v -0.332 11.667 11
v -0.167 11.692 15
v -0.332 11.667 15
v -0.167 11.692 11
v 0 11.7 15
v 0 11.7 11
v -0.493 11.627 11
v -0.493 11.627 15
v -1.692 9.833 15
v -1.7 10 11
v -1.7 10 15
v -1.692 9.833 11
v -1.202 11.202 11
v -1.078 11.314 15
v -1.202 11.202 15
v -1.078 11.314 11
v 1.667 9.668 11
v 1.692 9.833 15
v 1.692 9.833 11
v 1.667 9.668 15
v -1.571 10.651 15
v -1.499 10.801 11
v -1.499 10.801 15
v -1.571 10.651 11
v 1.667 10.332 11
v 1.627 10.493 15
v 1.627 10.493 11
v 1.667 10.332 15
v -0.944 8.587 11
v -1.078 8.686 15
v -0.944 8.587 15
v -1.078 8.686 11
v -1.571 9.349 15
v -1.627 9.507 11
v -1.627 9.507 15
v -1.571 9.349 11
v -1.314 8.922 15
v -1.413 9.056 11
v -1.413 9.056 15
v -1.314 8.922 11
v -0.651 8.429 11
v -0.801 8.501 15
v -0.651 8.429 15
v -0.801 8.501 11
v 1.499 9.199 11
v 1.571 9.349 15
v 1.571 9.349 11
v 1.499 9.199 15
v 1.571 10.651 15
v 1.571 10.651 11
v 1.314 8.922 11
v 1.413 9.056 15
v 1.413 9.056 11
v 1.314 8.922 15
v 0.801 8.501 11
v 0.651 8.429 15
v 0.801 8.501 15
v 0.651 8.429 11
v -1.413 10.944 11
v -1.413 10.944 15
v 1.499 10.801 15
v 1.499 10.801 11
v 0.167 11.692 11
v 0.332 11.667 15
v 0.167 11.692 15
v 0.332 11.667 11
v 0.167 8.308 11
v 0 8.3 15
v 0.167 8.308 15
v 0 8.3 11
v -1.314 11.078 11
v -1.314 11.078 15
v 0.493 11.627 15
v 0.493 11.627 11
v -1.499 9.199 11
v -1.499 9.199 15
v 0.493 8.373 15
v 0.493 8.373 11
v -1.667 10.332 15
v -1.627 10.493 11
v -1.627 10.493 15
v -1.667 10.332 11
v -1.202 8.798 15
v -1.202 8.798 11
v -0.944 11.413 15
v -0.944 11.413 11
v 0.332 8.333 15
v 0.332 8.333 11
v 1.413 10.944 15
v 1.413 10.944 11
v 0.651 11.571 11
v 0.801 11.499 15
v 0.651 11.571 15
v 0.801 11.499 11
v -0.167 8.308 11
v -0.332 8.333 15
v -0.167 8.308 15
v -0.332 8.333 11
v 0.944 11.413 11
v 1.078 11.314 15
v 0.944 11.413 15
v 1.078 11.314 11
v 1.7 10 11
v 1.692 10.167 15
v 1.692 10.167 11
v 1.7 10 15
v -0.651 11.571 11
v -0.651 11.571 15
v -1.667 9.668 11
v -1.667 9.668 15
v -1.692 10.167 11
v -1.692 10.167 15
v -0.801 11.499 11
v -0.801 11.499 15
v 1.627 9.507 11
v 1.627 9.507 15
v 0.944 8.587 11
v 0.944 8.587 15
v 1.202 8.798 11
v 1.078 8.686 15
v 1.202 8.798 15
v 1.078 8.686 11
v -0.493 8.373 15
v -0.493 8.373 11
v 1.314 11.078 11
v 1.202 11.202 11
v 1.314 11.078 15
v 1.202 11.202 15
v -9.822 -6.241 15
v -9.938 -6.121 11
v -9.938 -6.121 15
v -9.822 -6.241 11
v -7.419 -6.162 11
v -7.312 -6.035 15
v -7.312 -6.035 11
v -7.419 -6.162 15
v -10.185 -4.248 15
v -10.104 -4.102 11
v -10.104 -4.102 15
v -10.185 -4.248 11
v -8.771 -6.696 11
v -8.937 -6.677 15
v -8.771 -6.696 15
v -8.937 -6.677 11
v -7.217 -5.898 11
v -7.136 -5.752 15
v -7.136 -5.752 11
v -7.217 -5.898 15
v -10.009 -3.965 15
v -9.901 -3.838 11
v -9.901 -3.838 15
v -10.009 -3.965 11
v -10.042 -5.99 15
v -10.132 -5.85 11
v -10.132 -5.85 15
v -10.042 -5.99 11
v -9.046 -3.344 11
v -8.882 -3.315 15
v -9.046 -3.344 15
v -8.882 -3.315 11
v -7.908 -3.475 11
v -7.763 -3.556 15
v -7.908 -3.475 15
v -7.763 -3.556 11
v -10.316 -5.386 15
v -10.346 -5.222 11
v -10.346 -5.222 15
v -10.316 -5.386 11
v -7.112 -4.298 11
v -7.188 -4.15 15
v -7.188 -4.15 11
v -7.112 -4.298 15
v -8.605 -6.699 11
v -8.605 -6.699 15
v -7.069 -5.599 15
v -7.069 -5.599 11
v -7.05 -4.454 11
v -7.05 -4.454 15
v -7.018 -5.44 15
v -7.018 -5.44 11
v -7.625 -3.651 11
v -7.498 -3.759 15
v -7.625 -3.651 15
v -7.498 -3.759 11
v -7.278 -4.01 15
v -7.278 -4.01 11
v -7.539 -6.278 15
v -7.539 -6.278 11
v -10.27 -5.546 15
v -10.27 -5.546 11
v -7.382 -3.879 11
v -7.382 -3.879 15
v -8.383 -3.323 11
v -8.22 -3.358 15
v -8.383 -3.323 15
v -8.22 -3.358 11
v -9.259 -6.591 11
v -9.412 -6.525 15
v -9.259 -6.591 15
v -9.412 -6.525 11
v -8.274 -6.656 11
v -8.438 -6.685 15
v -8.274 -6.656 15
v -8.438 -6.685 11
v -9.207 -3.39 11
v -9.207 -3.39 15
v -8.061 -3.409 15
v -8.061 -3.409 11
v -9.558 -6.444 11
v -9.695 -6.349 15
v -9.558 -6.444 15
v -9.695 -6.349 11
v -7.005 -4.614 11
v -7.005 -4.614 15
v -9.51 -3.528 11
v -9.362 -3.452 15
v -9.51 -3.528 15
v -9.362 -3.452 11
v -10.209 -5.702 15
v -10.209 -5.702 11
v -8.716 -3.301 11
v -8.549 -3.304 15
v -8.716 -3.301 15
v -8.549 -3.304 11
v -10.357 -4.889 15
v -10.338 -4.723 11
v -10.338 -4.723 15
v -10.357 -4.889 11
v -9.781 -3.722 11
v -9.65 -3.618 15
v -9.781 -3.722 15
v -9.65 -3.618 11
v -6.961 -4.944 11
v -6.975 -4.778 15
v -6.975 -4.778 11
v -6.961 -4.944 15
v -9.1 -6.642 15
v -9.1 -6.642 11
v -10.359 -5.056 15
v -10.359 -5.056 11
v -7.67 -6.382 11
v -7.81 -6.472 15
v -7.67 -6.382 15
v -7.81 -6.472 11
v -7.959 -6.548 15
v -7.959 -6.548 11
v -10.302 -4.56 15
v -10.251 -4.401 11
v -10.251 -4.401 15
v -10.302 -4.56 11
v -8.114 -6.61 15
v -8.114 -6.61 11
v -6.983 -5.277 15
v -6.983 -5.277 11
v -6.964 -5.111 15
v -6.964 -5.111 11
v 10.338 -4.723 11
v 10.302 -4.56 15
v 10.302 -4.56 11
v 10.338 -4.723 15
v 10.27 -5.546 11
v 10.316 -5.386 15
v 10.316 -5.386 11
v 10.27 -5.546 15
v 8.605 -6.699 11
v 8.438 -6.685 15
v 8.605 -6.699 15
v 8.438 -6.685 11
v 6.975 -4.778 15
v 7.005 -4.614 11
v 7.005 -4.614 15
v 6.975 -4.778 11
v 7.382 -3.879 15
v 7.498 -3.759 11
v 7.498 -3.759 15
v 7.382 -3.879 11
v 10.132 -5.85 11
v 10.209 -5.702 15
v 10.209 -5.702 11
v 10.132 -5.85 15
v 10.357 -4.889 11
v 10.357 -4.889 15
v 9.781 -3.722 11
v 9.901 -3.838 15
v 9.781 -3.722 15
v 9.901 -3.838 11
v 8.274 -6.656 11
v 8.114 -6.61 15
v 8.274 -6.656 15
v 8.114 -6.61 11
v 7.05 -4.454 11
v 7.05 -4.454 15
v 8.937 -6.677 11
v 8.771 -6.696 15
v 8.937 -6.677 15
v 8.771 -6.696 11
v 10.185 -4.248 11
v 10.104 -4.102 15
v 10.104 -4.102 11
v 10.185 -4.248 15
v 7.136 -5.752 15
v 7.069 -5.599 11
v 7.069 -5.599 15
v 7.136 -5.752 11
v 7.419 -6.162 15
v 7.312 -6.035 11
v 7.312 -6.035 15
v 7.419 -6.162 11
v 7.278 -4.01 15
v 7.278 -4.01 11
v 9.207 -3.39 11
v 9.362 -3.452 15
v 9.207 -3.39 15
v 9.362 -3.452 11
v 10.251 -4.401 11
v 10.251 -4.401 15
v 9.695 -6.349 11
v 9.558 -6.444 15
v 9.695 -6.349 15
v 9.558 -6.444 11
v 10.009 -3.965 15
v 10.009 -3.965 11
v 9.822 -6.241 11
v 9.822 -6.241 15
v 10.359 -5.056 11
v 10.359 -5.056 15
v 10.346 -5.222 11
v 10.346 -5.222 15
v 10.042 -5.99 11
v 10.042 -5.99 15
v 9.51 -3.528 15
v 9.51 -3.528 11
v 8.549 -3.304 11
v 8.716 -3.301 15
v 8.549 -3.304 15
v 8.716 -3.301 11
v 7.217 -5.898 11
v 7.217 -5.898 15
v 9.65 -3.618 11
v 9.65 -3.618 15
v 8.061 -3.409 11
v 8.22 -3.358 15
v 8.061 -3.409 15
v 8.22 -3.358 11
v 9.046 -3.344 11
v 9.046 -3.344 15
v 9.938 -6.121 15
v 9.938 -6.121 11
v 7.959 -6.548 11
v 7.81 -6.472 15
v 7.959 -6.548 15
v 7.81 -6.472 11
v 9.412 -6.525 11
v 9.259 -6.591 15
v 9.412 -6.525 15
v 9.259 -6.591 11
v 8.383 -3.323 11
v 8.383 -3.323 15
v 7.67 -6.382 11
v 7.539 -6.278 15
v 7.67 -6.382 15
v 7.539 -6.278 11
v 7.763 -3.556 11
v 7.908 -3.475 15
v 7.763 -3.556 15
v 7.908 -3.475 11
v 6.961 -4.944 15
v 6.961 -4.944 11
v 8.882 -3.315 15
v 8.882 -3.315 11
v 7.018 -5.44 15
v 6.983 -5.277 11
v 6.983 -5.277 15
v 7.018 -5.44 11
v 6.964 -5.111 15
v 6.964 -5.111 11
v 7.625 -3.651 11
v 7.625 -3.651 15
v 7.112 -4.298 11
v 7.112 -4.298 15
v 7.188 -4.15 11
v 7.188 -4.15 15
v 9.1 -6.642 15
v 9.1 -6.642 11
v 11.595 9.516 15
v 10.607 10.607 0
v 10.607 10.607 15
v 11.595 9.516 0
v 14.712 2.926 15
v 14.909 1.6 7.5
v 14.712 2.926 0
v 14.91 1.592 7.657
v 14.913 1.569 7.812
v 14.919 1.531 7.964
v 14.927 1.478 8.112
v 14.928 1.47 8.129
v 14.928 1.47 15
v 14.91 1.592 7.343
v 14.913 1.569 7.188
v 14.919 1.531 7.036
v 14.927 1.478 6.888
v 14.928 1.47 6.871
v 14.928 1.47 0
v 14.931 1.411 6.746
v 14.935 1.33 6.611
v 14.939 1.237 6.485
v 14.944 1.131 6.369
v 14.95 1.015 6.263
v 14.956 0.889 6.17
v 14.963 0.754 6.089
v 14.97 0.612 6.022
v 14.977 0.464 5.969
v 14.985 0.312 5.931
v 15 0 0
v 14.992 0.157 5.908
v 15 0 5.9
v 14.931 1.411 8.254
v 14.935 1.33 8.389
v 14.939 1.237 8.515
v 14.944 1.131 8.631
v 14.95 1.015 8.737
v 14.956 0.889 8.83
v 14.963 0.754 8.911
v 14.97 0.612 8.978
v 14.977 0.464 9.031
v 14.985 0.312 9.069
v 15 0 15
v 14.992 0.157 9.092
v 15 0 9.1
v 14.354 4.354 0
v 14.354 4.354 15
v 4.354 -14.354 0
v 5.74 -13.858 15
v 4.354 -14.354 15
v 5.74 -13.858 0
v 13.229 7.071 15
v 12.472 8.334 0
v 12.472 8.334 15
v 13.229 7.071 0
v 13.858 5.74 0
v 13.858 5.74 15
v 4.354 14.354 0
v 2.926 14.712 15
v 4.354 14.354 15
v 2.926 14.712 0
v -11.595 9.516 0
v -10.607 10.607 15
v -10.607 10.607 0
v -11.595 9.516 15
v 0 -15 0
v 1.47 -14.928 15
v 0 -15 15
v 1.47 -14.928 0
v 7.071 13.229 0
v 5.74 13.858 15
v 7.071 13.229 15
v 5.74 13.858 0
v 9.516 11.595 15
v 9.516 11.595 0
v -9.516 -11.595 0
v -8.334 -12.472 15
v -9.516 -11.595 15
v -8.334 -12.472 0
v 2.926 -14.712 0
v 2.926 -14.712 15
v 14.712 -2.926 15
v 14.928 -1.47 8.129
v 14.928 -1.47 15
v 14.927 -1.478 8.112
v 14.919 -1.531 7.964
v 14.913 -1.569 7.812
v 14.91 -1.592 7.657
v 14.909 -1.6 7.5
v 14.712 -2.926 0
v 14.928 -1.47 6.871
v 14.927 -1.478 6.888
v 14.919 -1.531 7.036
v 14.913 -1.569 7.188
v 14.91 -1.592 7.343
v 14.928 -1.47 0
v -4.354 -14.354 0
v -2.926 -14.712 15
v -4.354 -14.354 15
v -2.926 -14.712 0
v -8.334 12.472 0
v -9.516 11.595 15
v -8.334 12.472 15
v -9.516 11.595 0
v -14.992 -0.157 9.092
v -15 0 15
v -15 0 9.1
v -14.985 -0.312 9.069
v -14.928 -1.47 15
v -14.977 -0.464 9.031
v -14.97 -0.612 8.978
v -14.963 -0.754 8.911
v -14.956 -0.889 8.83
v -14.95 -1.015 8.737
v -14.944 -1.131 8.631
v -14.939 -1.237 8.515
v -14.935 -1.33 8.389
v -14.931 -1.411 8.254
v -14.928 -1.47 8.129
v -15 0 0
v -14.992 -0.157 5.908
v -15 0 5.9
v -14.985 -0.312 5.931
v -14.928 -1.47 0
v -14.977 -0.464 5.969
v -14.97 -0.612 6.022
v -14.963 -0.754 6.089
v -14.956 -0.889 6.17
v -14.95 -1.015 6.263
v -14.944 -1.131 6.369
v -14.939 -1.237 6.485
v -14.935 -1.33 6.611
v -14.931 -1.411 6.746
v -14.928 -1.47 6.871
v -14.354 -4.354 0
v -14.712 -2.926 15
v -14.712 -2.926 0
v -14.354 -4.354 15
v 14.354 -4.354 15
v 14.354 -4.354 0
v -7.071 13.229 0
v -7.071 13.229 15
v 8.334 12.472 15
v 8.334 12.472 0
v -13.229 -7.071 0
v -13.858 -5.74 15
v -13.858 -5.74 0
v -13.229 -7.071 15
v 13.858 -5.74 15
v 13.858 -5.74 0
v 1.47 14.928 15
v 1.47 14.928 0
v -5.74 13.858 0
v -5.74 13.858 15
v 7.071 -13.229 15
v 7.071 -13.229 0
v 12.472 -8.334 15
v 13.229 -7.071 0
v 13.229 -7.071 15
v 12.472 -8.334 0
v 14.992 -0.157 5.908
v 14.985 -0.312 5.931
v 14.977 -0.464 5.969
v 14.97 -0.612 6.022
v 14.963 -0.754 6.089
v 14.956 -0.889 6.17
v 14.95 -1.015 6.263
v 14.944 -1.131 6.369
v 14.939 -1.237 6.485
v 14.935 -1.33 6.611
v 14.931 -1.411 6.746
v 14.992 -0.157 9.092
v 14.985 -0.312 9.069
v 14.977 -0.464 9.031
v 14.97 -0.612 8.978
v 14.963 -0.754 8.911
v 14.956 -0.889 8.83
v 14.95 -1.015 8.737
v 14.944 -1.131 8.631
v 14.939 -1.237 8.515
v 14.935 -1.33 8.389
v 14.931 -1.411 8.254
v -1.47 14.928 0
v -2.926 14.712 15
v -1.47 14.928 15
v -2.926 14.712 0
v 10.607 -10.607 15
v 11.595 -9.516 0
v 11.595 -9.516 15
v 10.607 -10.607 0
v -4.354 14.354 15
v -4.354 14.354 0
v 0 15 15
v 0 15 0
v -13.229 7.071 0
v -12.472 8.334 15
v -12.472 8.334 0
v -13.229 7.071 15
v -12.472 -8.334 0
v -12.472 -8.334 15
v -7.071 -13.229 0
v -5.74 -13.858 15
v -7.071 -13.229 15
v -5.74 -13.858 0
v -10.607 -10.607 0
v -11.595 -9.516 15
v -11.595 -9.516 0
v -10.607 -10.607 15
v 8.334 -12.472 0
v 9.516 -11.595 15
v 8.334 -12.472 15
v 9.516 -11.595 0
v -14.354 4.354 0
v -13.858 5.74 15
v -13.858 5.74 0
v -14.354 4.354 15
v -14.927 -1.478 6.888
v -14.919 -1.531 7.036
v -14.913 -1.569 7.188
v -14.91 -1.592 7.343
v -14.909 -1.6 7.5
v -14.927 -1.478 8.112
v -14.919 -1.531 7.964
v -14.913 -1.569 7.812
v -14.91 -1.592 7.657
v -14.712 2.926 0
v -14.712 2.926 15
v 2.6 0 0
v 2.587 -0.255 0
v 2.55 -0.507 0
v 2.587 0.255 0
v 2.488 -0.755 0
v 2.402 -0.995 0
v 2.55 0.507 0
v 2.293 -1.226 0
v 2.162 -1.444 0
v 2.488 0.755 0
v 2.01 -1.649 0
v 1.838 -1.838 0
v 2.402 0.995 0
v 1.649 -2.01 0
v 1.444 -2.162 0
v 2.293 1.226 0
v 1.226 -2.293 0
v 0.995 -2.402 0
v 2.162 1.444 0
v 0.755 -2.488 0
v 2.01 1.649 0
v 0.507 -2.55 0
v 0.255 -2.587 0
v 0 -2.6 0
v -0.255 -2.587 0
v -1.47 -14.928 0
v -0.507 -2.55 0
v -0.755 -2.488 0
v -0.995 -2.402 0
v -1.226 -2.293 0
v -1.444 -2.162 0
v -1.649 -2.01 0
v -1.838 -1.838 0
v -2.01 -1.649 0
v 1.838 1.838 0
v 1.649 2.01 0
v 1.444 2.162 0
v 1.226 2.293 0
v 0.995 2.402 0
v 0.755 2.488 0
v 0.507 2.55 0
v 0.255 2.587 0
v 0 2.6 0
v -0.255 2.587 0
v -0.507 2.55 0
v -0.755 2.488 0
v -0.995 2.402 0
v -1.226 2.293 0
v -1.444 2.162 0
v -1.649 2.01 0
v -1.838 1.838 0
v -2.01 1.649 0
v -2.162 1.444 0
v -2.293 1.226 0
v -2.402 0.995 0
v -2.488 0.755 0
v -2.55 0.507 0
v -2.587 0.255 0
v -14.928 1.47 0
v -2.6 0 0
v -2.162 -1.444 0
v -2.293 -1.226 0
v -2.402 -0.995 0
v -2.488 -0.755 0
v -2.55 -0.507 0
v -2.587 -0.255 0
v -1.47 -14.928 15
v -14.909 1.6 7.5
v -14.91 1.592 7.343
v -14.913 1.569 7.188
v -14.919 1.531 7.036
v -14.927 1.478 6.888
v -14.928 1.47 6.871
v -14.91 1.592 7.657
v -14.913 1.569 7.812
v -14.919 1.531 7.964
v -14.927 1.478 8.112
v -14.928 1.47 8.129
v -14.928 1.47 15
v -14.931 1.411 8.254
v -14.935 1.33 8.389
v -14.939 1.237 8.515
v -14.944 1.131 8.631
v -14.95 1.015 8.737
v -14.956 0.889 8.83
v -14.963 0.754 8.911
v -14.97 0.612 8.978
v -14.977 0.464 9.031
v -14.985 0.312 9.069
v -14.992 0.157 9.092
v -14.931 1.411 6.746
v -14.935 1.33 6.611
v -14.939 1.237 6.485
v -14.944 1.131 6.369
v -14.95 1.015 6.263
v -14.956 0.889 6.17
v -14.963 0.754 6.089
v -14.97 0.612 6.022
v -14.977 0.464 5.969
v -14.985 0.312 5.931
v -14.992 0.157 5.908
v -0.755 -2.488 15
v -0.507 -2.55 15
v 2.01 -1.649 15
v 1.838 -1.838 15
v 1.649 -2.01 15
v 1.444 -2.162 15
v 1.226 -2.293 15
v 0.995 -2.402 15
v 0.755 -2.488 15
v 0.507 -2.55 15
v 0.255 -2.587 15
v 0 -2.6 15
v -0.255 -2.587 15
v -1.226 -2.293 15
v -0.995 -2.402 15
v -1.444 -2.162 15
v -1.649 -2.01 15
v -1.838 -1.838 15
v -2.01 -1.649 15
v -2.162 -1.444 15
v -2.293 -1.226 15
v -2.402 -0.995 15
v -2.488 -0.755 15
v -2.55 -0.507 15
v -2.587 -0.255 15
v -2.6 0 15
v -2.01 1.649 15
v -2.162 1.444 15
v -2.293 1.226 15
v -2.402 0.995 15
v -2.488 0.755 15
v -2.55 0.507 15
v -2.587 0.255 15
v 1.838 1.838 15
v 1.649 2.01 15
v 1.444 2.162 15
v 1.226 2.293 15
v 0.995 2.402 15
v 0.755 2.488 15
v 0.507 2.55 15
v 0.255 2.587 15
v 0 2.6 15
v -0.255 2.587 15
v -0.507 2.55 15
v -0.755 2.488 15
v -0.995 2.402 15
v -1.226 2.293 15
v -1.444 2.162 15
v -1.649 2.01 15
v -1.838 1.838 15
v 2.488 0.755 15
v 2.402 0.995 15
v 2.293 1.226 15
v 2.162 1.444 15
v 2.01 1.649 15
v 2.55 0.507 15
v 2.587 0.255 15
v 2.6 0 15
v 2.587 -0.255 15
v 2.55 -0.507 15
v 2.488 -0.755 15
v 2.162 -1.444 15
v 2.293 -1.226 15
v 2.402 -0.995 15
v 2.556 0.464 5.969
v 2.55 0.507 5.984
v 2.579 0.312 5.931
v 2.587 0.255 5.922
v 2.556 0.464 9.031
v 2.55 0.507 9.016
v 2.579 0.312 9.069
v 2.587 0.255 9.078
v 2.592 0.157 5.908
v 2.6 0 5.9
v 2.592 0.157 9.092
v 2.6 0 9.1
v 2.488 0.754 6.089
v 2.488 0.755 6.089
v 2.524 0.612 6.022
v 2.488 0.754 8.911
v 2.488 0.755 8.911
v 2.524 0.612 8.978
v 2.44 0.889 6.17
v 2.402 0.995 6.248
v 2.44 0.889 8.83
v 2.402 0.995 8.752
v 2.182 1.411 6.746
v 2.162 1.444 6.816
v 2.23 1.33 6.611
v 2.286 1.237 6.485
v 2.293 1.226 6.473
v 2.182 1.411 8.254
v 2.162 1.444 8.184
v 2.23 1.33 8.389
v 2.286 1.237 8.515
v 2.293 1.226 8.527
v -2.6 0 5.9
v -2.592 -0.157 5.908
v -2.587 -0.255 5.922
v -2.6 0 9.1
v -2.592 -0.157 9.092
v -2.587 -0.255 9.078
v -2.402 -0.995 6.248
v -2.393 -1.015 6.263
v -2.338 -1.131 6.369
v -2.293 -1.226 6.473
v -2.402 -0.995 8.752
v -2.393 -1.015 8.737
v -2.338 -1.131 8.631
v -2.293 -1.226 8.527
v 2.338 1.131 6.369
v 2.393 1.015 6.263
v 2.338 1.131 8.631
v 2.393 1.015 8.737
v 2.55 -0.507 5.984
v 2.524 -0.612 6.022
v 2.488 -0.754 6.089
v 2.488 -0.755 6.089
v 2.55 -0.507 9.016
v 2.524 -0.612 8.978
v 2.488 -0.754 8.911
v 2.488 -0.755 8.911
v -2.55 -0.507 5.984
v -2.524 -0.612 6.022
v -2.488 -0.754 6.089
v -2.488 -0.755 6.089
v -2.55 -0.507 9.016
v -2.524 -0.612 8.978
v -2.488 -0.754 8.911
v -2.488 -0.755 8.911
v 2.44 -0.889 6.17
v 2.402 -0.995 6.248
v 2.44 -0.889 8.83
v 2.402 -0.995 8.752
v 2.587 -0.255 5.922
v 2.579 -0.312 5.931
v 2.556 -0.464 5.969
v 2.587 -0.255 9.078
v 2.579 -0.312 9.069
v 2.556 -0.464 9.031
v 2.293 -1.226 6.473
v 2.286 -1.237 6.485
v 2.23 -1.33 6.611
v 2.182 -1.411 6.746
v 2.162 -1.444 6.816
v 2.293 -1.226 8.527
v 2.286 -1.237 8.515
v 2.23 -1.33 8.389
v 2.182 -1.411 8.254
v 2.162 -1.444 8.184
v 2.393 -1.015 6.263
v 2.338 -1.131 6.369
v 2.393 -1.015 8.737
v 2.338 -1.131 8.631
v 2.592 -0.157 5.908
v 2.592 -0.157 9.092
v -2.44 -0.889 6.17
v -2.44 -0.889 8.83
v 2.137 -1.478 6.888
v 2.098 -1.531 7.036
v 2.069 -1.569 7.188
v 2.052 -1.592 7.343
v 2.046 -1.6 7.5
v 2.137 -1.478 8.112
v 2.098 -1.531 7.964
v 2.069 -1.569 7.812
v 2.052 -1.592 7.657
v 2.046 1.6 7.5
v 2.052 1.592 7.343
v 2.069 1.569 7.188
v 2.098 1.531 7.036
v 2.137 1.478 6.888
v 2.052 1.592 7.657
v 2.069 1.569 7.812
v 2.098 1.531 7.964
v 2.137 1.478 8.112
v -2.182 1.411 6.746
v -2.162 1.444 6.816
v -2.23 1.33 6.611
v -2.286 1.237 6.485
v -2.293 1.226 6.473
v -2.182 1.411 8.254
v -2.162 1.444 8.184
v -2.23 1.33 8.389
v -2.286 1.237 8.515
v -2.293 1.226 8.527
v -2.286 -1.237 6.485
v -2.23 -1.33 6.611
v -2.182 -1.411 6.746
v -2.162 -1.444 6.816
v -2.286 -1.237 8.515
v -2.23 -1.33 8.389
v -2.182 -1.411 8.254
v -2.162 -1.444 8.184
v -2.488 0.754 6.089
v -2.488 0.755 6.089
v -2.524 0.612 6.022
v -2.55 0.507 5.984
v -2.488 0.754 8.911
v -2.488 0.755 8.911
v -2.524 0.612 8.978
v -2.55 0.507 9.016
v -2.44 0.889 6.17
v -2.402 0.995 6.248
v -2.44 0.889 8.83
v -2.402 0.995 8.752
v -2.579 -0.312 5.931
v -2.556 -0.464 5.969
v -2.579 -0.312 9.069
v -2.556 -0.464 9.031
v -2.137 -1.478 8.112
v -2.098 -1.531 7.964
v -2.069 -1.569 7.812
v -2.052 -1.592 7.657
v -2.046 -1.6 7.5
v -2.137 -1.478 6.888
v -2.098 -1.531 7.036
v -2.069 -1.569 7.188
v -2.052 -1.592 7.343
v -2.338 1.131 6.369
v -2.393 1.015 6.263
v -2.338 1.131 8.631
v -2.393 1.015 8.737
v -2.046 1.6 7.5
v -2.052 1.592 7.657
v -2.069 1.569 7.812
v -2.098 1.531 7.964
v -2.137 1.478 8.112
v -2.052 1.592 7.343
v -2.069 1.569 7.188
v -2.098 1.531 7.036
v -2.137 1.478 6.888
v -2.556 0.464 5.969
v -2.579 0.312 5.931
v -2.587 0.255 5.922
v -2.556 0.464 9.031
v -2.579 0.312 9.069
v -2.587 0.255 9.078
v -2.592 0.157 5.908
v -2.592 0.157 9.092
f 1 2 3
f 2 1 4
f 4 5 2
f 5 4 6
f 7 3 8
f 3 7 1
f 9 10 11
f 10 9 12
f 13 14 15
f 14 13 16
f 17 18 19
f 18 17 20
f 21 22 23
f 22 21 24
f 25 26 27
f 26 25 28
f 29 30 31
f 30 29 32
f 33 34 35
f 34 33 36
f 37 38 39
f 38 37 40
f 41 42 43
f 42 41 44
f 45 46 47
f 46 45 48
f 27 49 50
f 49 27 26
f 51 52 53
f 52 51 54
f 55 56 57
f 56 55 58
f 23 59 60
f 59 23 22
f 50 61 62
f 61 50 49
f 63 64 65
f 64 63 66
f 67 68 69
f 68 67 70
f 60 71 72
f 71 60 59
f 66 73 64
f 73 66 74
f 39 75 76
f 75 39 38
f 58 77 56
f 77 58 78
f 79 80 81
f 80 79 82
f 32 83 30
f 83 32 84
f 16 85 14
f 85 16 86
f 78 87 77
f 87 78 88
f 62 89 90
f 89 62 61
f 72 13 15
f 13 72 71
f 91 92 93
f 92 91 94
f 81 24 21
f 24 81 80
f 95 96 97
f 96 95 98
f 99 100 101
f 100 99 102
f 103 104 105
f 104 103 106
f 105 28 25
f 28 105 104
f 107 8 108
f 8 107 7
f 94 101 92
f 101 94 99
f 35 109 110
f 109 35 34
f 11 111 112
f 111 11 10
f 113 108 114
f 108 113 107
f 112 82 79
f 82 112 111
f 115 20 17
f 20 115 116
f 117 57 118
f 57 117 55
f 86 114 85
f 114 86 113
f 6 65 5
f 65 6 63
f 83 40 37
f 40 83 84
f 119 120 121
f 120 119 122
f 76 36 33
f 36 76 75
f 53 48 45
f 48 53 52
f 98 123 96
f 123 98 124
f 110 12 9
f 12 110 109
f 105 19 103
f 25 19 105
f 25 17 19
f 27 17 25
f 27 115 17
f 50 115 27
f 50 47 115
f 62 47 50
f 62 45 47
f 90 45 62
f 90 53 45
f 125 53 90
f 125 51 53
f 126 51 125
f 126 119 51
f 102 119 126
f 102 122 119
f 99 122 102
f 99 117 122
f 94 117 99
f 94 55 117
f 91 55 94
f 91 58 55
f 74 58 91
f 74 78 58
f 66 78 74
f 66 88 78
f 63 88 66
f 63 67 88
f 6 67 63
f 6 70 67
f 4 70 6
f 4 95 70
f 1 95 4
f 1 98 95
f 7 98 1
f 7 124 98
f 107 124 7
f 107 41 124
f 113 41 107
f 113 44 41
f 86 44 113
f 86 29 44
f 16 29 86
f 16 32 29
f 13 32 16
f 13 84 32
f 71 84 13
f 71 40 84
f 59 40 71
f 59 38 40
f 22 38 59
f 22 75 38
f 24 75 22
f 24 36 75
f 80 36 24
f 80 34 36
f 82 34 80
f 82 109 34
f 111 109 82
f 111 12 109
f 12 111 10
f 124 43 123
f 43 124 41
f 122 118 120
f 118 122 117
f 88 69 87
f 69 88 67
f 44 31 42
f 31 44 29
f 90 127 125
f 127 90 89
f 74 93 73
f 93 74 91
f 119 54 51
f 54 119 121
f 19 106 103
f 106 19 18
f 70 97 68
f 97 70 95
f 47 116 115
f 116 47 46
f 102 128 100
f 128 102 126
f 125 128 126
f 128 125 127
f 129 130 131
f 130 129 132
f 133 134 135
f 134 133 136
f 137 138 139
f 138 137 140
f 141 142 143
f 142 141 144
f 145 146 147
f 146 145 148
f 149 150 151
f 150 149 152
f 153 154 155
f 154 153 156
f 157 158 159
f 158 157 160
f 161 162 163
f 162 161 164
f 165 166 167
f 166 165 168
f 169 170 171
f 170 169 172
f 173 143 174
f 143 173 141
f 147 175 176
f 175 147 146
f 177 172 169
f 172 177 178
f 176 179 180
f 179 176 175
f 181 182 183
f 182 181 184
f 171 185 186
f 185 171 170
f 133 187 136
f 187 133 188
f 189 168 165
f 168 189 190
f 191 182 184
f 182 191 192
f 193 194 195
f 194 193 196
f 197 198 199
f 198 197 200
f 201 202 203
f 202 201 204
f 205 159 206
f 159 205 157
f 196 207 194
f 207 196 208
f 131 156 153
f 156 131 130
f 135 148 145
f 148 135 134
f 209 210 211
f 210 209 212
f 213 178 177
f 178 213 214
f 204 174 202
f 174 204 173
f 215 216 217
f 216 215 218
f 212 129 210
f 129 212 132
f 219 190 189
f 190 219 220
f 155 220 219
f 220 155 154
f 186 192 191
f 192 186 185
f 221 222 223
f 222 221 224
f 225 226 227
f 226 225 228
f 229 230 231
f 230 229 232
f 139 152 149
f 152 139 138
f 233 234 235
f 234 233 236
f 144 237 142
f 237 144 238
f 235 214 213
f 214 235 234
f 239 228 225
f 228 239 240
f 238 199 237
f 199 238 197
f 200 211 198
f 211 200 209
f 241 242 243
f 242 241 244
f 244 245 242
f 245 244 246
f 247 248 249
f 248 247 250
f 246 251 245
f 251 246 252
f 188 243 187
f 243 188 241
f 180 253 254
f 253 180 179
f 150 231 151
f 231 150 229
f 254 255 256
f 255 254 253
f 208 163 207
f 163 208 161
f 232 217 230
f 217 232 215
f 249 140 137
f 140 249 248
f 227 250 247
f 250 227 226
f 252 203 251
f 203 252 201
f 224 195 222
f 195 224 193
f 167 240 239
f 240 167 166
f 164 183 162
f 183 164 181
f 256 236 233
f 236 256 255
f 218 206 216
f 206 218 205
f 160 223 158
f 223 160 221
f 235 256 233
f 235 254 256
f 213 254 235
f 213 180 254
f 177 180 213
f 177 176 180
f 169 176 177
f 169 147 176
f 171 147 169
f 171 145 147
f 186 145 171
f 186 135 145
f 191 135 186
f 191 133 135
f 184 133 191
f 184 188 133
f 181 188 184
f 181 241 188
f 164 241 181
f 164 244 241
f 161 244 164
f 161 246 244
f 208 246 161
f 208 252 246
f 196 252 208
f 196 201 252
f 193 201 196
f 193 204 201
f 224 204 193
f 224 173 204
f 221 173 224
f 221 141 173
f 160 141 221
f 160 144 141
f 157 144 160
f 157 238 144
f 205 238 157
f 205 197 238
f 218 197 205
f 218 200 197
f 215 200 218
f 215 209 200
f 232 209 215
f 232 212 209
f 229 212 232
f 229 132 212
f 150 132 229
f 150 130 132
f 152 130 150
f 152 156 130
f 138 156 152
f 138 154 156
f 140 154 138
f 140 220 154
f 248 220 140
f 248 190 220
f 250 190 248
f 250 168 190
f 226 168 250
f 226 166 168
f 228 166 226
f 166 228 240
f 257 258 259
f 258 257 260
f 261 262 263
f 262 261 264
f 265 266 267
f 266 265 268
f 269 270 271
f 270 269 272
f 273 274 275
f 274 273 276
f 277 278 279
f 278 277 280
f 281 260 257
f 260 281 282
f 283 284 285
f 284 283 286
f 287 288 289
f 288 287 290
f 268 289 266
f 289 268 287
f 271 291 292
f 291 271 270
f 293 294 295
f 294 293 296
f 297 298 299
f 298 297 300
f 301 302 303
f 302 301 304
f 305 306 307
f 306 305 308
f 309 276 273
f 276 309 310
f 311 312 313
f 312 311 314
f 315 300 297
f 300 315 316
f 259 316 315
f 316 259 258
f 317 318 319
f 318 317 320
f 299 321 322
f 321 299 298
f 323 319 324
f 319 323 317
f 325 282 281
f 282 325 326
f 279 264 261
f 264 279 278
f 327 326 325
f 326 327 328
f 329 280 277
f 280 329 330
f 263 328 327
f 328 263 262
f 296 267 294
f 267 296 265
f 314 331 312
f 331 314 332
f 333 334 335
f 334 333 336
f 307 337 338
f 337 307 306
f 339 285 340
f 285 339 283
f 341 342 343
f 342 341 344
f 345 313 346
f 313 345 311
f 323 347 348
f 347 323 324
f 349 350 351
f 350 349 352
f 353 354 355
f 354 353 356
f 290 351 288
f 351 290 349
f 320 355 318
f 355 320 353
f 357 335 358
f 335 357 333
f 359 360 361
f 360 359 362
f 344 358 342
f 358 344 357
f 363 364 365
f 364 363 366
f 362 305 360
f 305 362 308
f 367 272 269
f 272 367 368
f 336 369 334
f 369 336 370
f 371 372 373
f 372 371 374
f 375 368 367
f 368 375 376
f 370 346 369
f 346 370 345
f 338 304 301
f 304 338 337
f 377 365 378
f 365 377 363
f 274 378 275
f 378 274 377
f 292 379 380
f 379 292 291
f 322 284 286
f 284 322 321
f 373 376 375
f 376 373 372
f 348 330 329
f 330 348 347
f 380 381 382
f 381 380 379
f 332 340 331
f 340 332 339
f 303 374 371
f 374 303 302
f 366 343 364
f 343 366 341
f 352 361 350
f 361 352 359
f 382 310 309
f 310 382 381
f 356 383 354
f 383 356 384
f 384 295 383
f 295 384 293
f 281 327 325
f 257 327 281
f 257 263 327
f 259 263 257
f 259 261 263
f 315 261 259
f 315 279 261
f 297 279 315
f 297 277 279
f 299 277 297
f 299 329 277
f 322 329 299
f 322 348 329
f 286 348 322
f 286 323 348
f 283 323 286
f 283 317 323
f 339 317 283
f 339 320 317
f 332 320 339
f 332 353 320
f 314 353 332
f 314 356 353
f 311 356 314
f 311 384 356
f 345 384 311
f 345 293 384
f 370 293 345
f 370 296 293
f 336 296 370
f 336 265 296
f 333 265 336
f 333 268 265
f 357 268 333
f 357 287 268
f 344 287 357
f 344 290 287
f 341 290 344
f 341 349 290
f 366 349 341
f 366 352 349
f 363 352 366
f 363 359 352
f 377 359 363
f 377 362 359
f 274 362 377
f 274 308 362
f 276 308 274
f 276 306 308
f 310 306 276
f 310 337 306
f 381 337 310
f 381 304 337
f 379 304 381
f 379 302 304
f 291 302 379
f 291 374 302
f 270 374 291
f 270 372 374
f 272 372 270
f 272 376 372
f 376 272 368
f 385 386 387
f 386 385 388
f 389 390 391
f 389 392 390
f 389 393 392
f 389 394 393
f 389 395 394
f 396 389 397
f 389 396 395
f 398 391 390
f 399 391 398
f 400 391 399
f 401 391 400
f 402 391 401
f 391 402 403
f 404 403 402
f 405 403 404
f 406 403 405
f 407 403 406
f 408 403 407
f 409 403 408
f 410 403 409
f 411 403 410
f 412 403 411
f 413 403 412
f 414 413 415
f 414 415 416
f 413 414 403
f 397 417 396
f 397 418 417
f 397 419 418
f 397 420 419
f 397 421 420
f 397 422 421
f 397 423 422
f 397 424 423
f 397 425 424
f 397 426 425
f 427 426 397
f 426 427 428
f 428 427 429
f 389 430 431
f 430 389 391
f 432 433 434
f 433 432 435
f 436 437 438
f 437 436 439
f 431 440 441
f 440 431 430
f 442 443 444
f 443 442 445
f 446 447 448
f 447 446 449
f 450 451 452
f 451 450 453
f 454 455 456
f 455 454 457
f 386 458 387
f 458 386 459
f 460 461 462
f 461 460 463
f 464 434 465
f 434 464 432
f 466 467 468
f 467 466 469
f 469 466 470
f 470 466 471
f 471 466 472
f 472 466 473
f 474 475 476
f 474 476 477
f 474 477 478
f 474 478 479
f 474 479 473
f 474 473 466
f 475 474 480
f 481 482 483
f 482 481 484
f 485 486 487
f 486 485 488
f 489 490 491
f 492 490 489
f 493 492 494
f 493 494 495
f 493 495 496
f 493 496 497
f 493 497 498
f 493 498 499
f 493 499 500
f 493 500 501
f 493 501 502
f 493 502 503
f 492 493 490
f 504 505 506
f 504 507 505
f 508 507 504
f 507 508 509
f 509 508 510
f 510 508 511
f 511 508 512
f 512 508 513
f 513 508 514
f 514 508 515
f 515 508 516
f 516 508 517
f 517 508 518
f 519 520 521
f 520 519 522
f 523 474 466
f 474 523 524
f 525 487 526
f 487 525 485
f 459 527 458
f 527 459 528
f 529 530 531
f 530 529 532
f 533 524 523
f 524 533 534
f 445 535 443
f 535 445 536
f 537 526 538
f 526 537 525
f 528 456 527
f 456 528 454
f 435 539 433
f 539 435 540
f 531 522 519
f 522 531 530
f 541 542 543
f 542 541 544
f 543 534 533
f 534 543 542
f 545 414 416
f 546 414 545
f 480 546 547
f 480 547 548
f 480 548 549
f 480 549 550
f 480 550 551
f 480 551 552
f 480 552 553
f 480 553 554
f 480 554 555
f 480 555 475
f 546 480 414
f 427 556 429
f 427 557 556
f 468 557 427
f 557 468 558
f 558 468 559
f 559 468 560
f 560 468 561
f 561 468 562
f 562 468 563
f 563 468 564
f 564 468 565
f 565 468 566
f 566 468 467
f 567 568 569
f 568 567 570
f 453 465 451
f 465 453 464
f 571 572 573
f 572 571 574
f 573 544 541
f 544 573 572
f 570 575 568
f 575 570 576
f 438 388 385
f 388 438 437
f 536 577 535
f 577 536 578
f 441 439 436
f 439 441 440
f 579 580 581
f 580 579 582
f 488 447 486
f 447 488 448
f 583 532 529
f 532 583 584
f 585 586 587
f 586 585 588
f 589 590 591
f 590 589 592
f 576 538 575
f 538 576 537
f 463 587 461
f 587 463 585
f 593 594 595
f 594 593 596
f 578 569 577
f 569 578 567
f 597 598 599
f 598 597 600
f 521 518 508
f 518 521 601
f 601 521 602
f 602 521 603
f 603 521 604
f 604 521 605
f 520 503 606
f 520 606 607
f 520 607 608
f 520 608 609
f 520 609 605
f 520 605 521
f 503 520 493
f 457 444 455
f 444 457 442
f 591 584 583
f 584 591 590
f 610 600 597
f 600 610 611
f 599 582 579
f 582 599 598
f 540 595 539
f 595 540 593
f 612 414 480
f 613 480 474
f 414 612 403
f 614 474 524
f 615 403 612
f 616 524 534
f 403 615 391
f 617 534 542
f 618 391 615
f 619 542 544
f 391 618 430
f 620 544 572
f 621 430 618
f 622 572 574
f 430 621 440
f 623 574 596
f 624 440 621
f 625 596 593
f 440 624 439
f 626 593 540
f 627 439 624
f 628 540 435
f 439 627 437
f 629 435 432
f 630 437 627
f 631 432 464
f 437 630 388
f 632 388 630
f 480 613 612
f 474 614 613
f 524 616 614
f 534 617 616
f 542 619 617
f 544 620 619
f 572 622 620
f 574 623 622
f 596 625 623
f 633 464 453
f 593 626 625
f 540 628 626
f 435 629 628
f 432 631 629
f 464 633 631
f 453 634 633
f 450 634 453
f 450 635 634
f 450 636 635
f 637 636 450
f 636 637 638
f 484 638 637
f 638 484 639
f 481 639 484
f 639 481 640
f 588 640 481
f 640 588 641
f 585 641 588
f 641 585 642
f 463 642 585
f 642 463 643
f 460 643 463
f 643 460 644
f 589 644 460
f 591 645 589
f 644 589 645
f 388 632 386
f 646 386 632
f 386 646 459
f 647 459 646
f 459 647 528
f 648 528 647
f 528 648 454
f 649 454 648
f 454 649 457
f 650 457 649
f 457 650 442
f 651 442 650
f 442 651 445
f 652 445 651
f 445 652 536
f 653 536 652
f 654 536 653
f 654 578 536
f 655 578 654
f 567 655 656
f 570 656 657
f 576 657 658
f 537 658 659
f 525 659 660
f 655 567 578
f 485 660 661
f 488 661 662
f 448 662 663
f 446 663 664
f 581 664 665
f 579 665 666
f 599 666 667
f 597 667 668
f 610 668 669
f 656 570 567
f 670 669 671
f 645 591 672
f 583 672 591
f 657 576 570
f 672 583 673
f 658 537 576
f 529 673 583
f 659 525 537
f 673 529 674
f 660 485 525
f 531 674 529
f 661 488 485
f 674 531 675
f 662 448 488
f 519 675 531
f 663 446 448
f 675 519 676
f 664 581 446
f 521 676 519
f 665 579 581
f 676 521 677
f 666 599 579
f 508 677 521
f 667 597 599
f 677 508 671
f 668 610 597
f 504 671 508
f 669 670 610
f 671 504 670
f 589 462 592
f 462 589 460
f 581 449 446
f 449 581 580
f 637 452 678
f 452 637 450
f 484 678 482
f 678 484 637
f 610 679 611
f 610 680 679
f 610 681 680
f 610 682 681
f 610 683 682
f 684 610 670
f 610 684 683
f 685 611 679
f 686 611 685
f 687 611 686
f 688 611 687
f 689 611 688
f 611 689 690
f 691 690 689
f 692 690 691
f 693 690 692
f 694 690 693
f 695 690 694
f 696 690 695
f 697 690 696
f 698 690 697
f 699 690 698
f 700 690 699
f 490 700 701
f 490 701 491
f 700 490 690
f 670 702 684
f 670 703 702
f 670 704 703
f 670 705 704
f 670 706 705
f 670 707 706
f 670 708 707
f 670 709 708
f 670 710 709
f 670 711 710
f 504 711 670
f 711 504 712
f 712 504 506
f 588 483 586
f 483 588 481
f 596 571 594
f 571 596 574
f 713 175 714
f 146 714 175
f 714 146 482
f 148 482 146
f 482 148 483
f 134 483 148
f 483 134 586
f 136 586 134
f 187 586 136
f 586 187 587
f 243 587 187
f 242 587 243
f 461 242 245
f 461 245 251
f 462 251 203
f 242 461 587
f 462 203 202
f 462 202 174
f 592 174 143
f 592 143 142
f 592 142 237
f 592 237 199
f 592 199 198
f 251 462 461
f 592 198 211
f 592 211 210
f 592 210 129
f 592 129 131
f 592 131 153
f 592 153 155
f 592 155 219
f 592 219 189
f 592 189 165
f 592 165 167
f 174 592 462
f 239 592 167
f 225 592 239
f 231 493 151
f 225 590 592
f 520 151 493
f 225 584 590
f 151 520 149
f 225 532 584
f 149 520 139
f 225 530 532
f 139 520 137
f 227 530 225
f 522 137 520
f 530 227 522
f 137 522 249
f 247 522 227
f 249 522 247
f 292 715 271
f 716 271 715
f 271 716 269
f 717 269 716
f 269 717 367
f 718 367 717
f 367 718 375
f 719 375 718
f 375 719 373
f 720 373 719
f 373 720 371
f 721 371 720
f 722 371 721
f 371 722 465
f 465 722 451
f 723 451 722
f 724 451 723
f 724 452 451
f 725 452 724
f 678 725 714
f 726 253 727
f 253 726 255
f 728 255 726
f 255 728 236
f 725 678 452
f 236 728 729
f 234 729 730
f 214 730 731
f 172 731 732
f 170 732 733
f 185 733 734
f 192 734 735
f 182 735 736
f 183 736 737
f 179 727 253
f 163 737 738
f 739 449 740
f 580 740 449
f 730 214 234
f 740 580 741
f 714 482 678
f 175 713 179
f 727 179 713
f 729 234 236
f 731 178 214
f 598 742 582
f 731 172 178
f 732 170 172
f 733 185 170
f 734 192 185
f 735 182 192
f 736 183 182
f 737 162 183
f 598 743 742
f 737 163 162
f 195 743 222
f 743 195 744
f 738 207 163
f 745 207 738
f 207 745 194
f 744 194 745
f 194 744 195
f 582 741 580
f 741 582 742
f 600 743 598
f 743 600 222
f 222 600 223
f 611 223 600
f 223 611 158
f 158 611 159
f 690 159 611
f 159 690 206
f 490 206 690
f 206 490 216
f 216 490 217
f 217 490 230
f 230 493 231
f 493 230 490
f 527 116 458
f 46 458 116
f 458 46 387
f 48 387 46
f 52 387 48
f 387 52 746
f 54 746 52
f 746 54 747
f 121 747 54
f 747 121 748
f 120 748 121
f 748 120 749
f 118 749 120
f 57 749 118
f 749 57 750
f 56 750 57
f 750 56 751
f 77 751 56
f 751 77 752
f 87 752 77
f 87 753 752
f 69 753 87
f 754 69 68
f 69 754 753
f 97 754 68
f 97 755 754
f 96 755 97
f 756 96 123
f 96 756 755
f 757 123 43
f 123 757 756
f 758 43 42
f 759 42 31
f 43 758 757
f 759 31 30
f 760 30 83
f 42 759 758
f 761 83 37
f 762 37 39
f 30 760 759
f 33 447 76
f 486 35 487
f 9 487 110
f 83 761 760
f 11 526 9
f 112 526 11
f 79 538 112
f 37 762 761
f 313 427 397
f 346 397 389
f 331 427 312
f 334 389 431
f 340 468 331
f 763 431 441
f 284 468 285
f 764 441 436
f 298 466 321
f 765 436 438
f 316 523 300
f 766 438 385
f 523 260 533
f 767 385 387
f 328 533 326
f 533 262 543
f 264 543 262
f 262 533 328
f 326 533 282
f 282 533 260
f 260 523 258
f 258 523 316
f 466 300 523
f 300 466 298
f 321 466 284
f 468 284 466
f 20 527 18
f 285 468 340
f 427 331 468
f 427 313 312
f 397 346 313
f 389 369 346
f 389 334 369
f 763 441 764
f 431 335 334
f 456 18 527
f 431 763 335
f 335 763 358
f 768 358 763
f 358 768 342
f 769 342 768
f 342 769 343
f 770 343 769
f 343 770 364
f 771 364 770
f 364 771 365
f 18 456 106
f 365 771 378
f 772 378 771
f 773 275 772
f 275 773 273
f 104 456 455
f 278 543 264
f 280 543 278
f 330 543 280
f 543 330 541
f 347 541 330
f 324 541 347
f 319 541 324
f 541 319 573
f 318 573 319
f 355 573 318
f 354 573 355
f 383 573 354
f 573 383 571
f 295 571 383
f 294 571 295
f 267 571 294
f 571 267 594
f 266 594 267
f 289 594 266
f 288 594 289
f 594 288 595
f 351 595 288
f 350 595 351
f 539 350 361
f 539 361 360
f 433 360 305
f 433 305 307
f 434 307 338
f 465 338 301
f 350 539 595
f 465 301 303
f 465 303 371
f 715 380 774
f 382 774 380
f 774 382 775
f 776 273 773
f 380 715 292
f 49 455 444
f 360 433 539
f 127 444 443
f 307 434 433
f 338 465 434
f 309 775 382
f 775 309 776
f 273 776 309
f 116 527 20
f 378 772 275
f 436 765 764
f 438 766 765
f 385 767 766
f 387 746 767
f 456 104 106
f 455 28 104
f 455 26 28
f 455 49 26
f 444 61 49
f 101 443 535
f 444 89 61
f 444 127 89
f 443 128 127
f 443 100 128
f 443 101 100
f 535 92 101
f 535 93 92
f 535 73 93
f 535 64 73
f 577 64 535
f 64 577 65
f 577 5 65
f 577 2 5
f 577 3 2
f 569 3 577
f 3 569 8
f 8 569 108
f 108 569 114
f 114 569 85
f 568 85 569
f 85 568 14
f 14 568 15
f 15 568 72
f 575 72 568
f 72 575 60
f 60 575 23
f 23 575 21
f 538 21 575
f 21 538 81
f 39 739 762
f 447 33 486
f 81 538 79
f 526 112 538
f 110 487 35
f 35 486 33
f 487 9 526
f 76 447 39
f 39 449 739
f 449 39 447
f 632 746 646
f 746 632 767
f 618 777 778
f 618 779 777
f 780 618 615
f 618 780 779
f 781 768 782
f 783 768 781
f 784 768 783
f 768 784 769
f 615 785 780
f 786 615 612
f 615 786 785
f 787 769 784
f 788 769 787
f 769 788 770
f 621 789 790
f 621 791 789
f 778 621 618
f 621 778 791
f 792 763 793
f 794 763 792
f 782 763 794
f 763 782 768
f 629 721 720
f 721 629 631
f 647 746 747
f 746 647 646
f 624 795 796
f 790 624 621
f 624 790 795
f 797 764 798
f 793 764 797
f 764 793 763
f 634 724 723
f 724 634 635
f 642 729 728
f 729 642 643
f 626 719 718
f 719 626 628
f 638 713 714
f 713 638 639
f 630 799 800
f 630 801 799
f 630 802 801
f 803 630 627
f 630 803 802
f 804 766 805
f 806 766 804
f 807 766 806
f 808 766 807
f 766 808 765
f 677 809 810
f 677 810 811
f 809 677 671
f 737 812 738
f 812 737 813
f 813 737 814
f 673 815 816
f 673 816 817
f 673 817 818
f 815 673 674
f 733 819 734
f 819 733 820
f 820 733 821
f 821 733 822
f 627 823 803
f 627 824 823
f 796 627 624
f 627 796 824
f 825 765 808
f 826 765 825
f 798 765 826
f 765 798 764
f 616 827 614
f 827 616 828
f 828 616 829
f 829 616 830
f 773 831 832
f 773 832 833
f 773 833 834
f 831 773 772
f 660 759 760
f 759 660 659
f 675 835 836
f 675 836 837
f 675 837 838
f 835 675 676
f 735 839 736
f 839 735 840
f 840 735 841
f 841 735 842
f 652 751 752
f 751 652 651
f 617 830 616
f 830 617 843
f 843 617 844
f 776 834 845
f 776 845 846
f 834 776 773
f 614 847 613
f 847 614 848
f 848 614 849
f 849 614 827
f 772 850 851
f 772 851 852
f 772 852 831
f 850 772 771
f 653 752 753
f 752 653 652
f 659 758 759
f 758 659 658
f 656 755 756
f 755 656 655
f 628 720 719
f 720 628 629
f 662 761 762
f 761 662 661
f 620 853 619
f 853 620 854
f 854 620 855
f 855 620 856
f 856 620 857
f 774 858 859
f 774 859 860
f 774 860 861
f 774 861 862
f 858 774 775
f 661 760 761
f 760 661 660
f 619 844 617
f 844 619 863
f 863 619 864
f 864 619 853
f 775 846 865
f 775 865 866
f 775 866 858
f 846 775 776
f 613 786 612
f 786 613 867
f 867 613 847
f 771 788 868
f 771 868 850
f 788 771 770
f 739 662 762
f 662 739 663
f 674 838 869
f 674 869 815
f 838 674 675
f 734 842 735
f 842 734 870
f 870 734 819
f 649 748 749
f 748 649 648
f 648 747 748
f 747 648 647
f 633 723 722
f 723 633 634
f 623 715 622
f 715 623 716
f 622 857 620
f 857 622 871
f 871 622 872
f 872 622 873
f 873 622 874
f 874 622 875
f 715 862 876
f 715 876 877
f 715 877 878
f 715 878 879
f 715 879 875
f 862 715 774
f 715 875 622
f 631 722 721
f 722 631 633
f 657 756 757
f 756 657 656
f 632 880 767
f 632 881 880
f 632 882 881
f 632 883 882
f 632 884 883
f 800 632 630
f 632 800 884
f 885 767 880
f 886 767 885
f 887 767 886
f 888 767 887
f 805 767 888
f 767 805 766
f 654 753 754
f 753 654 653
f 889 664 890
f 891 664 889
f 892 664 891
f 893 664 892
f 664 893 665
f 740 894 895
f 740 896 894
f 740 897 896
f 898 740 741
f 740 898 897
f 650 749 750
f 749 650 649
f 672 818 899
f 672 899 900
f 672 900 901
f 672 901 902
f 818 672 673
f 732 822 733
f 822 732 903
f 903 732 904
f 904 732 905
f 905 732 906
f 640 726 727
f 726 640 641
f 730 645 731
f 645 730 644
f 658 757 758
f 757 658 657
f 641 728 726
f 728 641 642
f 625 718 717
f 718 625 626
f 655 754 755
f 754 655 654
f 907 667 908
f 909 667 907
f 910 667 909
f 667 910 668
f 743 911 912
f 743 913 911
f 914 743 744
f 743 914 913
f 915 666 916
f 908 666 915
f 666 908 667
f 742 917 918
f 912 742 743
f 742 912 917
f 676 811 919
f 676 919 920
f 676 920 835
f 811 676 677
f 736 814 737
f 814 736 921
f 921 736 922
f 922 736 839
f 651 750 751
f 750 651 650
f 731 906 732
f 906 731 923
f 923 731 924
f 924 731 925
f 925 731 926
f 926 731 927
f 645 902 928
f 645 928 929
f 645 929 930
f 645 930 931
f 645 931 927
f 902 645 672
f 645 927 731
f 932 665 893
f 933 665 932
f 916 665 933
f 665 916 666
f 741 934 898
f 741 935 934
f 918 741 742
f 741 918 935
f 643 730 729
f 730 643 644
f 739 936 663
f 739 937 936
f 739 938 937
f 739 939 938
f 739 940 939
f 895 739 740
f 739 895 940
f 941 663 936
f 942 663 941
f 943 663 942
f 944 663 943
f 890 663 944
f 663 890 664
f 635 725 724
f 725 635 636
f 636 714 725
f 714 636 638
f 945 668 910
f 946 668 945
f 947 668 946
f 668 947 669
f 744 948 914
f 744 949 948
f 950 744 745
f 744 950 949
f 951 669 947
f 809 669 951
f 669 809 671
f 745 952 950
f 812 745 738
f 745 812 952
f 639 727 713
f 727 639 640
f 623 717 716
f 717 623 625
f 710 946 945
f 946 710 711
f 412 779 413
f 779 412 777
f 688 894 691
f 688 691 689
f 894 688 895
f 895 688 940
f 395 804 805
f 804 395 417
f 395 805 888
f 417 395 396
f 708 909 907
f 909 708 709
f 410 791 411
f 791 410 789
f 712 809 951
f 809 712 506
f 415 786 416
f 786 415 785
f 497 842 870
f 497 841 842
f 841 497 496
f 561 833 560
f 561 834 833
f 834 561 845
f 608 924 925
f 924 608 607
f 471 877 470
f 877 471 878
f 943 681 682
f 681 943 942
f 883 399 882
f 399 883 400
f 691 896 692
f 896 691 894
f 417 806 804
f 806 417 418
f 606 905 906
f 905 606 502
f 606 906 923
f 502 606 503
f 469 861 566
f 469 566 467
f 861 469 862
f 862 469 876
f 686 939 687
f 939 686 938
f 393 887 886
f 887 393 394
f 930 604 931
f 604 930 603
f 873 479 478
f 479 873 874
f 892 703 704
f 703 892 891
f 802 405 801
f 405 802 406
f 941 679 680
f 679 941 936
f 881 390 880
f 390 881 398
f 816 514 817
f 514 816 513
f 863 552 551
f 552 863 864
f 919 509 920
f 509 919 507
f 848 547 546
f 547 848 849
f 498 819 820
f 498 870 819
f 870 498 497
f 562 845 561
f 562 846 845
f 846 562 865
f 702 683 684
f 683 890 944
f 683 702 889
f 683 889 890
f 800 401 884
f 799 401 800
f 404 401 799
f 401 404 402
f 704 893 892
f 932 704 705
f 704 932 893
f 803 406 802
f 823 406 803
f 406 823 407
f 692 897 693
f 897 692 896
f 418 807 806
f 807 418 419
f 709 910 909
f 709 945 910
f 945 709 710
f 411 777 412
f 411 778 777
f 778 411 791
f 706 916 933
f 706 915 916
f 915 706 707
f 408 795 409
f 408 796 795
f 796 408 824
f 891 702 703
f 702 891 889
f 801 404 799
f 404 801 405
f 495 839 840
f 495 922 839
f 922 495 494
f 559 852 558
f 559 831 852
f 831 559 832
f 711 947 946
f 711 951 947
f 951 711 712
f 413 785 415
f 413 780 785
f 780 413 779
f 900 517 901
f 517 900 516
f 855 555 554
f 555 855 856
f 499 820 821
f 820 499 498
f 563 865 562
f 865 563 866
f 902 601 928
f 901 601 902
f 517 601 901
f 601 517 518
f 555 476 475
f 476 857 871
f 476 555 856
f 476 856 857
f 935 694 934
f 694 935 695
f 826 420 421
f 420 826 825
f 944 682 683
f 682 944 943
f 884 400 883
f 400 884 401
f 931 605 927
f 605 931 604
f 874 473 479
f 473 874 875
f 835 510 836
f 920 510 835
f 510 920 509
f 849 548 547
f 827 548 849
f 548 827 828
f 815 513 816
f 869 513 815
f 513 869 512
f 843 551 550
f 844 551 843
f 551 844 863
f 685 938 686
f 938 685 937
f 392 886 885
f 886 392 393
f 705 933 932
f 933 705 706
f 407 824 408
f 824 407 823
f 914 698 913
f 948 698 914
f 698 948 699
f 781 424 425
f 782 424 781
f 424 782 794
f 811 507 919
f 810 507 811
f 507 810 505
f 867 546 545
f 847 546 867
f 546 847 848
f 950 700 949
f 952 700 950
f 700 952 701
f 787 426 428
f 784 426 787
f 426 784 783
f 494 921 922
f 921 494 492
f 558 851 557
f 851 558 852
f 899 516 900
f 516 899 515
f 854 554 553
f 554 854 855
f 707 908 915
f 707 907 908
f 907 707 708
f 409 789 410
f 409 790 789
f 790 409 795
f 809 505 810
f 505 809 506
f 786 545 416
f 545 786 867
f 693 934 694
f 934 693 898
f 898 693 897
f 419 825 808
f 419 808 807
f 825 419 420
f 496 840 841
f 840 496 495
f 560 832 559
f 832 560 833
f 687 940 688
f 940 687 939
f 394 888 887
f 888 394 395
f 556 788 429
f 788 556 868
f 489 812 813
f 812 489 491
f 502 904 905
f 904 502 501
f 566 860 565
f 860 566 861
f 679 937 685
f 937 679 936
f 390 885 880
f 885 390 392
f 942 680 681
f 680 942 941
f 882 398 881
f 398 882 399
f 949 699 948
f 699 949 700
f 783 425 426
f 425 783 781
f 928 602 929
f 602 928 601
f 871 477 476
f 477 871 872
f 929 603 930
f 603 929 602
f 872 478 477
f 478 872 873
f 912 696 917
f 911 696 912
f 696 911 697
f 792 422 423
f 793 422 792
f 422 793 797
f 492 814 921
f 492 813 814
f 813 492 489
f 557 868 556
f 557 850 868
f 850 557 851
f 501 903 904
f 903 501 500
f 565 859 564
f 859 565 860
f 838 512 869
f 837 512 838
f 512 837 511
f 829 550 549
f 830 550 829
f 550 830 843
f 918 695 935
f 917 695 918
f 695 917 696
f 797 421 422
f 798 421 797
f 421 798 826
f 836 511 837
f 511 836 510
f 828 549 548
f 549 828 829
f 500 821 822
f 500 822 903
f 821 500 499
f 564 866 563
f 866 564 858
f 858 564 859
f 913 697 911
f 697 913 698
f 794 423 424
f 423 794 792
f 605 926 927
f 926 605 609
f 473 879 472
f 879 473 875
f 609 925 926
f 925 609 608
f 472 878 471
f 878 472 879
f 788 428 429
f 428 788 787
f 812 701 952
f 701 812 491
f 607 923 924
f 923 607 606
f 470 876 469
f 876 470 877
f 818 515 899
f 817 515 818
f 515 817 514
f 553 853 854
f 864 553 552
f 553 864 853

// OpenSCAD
// NEMA17 shaft hub (Recommended tier) -- see PRINTS.md.
// Clamps onto the NEMA17's 5mm D-shaft via a radial M3 set screw, bolts
// to the platter's underside via 3x M3 on the hub_bolt_circle_d pattern
// (must match platter.scad). Print with the bore axis vertical, no
// supports needed. PETG recommended -- this part sees the most stress
// in the whole build (all drive torque passes through it).
$fn = 64;

hub_d = 30;   // bumped from 25 -- with a 20mm bolt circle + 3.4mm holes, 25 left only ~0.8mm wall at the hub edge
hub_h = 15;

shaft_bore_d = 5.2;    // NEMA17 shaft is 5mm nominal -- +0.2mm print fit allowance
setscrew_d = 3.2;      // M3 set screw, thread-formed directly into the print
                       // (or tap M3 / use a threaded insert)

bolt_circle_d = 20;    // MUST match platter.scad's hub_bolt_circle_d
bolt_hole_d = 3.4;
bolt_angles = [90, 210, 330];  // MUST match platter.scad's hub_angles

difference() {
    cylinder(d = hub_d, h = hub_h);

    translate([0, 0, -1]) cylinder(d = shaft_bore_d, h = hub_h + 2);

    // radial set screw, midway up the bore
    translate([0, 0, hub_h / 2])
        rotate([0, 90, 0])
            cylinder(d = setscrew_d, h = hub_d, center = true);

    translate([0, 0, hub_h - 4])
        for (a = bolt_angles)
            rotate([0, 0, a])
                translate([bolt_circle_d / 2, 0, 0])
                    cylinder(d = bolt_hole_d, h = 10);
}
